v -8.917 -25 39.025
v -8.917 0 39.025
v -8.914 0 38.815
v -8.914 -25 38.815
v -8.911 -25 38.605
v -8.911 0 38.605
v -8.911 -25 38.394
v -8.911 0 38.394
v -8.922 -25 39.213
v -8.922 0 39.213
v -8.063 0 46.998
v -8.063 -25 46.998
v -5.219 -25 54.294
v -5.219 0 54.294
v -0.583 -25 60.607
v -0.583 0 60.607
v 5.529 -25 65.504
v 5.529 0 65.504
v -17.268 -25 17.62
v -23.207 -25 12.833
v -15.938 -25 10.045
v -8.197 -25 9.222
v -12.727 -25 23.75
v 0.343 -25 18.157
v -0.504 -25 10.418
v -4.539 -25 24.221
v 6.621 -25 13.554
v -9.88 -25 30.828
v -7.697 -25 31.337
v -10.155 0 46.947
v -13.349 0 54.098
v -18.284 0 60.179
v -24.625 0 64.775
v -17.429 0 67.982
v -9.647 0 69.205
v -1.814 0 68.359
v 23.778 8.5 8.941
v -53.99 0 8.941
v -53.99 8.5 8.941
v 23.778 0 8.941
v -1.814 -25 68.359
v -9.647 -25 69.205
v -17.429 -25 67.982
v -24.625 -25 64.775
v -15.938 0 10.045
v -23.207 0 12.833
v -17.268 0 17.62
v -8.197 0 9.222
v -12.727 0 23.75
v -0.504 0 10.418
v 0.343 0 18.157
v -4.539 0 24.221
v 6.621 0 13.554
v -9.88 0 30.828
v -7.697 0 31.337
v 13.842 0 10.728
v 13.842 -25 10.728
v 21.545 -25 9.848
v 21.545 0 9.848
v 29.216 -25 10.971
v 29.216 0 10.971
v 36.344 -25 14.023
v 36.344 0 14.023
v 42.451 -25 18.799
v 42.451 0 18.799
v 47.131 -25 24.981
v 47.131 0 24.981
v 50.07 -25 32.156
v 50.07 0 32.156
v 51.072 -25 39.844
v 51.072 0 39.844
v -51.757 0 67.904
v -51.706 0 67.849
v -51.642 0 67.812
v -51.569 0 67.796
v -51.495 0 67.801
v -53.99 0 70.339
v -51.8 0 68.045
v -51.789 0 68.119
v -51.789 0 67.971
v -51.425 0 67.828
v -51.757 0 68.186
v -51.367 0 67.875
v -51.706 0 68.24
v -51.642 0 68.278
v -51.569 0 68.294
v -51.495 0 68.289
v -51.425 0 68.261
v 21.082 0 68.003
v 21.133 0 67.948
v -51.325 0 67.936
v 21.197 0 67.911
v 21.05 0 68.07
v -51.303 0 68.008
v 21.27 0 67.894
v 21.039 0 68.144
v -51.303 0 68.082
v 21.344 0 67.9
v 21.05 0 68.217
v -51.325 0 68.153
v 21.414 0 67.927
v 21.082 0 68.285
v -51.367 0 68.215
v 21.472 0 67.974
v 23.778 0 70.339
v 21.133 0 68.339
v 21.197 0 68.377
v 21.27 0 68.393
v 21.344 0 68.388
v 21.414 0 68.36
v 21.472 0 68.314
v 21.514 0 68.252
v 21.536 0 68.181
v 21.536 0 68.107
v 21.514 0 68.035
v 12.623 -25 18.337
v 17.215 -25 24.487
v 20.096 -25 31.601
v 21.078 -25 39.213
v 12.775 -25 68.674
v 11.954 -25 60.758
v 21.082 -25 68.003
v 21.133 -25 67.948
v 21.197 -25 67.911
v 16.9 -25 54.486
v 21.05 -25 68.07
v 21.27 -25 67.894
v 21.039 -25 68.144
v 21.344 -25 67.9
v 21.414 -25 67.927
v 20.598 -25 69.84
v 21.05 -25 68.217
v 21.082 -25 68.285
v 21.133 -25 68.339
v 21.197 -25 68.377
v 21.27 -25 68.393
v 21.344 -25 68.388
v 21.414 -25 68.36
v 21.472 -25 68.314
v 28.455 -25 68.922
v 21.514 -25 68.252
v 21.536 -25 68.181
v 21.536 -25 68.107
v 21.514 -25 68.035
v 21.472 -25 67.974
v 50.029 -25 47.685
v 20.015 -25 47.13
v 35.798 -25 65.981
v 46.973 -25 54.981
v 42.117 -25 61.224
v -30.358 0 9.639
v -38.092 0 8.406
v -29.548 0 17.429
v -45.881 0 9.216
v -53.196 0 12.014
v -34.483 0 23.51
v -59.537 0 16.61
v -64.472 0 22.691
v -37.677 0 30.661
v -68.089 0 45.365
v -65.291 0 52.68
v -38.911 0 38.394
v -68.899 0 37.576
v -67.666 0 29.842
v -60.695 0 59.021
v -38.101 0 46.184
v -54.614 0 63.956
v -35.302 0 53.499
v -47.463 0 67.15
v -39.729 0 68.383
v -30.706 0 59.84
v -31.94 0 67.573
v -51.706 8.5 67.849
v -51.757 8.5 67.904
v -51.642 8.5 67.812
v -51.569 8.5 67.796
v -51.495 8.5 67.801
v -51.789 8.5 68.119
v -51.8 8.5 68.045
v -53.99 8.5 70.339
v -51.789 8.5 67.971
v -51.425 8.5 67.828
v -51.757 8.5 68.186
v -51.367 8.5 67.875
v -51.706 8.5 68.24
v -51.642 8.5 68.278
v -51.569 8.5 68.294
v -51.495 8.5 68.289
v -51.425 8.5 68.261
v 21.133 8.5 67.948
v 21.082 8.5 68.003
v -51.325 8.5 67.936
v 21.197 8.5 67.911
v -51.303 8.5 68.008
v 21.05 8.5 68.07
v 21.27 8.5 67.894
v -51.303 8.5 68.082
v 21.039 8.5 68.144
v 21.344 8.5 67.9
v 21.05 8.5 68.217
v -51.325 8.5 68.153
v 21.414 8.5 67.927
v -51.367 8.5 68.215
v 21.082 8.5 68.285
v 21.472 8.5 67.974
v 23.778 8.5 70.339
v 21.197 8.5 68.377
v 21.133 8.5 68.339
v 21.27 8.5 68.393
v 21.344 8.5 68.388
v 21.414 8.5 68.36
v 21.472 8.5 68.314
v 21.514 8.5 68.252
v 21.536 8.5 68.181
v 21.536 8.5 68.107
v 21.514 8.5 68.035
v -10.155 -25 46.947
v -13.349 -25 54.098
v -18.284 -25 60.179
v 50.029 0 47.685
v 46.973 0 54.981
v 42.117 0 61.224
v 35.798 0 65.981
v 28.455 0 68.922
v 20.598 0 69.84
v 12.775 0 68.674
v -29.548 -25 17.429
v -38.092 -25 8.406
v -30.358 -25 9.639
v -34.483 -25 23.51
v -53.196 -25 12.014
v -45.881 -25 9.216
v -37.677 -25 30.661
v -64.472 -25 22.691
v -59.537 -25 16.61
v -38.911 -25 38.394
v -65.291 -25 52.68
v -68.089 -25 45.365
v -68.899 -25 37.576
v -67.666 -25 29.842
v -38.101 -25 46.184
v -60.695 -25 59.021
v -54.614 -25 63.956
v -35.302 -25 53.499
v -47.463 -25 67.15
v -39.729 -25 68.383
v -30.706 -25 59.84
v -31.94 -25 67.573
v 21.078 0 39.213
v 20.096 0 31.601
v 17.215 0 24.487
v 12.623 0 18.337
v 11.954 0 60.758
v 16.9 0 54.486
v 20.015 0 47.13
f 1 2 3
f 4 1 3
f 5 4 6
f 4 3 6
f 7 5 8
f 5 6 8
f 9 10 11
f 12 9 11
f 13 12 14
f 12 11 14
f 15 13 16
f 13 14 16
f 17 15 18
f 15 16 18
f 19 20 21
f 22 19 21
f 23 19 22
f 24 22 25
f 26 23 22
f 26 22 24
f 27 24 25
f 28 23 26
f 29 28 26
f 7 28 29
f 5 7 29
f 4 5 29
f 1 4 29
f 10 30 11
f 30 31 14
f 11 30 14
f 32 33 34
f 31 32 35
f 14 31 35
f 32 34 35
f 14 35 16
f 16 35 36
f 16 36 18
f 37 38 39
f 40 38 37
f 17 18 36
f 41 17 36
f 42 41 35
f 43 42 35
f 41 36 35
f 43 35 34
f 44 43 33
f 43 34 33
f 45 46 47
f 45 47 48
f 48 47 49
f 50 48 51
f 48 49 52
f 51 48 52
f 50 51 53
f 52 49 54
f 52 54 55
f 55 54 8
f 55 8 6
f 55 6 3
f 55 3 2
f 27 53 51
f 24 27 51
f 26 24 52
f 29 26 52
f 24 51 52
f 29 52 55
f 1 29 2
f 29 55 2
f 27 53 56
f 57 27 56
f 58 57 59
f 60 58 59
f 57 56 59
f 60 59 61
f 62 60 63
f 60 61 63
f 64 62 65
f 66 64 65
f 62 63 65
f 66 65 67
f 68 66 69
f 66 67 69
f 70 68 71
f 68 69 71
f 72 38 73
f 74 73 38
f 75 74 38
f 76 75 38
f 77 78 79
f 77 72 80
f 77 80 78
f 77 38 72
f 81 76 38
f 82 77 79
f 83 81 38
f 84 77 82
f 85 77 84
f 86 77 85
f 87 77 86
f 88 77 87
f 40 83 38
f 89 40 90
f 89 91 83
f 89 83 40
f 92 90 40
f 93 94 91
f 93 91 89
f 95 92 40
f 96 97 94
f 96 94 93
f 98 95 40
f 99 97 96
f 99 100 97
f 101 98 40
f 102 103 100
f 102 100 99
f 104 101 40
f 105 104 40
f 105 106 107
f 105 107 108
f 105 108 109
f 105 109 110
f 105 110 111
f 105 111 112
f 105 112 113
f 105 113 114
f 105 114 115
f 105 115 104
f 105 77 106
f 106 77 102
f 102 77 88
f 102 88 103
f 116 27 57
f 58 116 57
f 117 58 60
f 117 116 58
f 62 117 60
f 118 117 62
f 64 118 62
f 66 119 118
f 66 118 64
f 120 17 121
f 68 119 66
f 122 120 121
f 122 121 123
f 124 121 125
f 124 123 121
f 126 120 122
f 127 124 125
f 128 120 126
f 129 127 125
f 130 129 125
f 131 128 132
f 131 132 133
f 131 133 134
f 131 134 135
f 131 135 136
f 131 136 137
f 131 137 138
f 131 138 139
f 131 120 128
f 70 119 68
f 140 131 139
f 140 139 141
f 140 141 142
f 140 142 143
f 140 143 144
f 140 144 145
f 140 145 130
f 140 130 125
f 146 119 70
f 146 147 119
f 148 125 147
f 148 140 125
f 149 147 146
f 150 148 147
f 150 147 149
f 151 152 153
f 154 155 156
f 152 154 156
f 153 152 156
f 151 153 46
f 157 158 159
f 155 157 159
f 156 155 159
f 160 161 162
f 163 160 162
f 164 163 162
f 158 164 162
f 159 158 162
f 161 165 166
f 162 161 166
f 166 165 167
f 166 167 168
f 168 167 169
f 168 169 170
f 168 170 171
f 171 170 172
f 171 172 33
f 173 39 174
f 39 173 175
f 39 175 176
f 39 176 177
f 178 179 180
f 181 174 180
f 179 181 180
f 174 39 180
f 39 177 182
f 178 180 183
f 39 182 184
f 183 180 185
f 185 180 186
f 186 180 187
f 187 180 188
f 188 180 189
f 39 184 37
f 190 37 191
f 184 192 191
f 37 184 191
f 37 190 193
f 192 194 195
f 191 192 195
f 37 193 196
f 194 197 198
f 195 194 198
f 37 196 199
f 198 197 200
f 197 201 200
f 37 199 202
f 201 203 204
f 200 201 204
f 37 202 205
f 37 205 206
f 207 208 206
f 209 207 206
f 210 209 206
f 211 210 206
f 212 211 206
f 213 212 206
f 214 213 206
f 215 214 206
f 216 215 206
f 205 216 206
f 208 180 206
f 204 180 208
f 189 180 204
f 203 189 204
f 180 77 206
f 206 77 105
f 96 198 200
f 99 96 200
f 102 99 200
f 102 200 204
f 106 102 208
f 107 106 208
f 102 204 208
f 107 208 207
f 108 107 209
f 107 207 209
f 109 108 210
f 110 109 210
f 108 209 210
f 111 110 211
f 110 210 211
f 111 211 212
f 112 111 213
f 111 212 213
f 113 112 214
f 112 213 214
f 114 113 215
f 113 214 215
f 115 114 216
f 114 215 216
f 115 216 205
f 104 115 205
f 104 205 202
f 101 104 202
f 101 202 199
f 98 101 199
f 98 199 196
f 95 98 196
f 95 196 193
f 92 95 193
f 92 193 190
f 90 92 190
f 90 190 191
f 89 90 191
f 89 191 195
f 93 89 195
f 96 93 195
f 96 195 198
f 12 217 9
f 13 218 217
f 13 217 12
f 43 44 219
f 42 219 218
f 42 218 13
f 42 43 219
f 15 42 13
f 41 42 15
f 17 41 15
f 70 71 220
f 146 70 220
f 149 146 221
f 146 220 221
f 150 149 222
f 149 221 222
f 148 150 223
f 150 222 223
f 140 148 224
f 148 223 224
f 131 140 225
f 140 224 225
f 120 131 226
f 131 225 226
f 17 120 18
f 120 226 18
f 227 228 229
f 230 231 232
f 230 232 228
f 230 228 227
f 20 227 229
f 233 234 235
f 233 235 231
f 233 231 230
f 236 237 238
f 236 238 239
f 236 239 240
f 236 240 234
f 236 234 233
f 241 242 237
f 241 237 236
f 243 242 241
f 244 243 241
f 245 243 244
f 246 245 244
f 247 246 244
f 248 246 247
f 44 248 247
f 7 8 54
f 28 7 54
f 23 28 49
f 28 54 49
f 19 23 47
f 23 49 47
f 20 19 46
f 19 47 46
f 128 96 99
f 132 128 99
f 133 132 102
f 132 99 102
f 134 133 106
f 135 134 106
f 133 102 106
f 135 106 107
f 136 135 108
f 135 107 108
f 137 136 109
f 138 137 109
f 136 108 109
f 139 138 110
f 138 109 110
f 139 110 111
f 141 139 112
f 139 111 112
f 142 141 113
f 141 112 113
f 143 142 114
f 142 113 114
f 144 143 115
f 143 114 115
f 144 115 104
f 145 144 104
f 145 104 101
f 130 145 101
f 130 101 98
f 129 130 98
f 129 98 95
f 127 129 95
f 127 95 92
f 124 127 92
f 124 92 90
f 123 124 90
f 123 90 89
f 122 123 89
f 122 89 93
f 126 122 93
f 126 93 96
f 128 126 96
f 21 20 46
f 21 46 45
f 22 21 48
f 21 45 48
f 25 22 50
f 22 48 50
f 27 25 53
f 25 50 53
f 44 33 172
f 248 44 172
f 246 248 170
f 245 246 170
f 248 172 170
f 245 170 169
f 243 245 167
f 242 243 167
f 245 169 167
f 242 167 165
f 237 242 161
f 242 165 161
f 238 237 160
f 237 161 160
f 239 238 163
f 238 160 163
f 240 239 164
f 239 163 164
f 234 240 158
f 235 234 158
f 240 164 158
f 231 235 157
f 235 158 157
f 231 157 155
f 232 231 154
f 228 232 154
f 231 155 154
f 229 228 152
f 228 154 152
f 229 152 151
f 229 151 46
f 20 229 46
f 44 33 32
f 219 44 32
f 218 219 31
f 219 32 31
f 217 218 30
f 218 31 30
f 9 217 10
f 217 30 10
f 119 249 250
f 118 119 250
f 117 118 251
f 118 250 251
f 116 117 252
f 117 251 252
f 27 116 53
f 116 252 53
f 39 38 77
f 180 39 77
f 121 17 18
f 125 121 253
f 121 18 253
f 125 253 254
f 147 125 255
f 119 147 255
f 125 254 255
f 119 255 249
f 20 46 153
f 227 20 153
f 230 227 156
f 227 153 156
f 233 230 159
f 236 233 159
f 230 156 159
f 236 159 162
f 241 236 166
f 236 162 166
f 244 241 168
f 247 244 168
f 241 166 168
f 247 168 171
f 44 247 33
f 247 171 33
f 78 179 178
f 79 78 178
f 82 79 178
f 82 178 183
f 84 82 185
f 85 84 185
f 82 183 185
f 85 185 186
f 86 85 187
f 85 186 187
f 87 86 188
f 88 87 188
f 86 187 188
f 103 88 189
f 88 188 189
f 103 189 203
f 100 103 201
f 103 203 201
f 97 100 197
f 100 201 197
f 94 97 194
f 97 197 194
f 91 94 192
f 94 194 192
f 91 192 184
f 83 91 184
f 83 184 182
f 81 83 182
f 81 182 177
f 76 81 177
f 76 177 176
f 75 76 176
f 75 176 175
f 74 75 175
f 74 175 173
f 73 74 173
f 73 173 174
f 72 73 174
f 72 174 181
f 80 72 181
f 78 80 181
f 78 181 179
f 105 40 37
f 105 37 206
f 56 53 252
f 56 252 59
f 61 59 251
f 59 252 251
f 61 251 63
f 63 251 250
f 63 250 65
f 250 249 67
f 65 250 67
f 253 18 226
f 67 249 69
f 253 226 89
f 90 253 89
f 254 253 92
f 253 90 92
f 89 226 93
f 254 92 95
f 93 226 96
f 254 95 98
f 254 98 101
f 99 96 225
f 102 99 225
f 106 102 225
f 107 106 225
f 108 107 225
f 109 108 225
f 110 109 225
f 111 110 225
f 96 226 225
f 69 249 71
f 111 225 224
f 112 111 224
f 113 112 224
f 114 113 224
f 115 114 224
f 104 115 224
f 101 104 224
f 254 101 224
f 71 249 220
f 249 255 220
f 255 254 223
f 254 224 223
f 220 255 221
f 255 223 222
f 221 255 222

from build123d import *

# Parameters (mm, degrees)
F1_DEPTH = 25
F2_W     = 77.7685903013
F2_H     = 61.3984446973
F3_DEPTH = 8.5
F4_R     = 0.25
F5_DEPTH = 52.9


with BuildPart() as f1:
    # F0 (on Front) → F1 (new body)
    with BuildSketch(Plane.XZ):
        with BuildLine():
            ThreePointArc((-24.6252371606, 64.7749764202), (-68.899377051, 37.5757018533), (-23.2070443664, 12.832809261))
            ThreePointArc((-23.2070443664, 12.832809261), (-38.9105528593, 38.3944958448), (-24.6252371606, 64.7749764202))
        make_face()
    extrude(amount=F1_DEPTH)


with BuildPart() as f1b:
    # F0 (on Front) → F1, piece 2 (new body)
    with BuildSketch(Plane.XZ):
        with BuildLine():
            ThreePointArc((21.0782713324, 39.2132898363), (17.2153351945, 24.4873300147), (6.6213451544, 13.553733017))
            ThreePointArc((6.6213451544, 13.553733017), (36.3440176728, 14.0226209778), (51.0716362988, 39.8442082095))
            ThreePointArc((51.0716362988, 39.8442082095), (35.7975961204, 65.9812720716), (5.5285624767, 65.5037650288))
            ThreePointArc((5.5285624767, 65.5037650288), (16.8998585641, 54.4856712104), (21.0782713324, 39.2132898363))
        make_face()
    extrude(amount=F1_DEPTH)


with BuildPart() as f1c:
    # F0 (on Front) → F1, piece 3 (new body)
    with BuildSketch(Plane.XZ):
        with BuildLine():
            ThreePointArc((-24.6252371606, 64.7749764202), (-13.3488662754, 54.0980043378), (-8.9217286676, 39.2132898363))
            ThreePointArc((-8.9217286676, 39.2132898363), (-5.2188388937, 54.2944993538), (5.5285624767, 65.5037650288))
            ThreePointArc((5.5285624767, 65.5037650288), (-9.6465884056, 69.2045315305), (-24.6252371606, 64.7749764202))
        make_face()
    extrude(amount=F1_DEPTH)


with BuildPart() as f1d:
    # F0 (on Front) → F1, piece 4 (new body)
    with BuildSketch(Plane.XZ):
        with BuildLine():
            ThreePointArc((-8.9171878929, 39.025414218), (-8.9122116636, 38.7099724752), (-8.9105528593, 38.3944958448))
            ThreePointArc((-8.9105528593, 38.3944958448), (-12.7274929275, 23.7504741088), (-23.2070443664, 12.832809261))
            ThreePointArc((-23.2070443664, 12.832809261), (-8.1968689297, 9.2220481421), (6.6213451544, 13.553733017))
            ThreePointArc((6.6213451544, 13.553733017), (-4.5391110305, 24.2208404151), (-8.9171878929, 39.025414218))
        make_face()
    extrude(amount=F1_DEPTH)


with BuildPart() as f3:
    # F2 (on Front) → F3 (new body)
    with BuildSketch(Plane.XZ):
        with Locations((-15.1060316712, 39.6397346631)):
            Rectangle(F2_W, F2_H)
    extrude(amount=-F3_DEPTH)


with BuildPart() as f5_tool:
    # F4 (on face) → F5 (new body)
    with BuildSketch(Plane(origin=(0, 8.5, 0), x_dir=(-1, 0, 0), z_dir=(0, 1, 0))):
        with Locations((-21.2886072695, 68.143799901)):
            Circle(F4_R)
        with Locations((51.5504516661, 68.0448934436)):
            Circle(F4_R)
    extrude(amount=-F5_DEPTH)


with BuildPart() as f1b_1:
    add(f1b.part)

    # F5: cut by f5_tool
    add(f5_tool.part, mode=Mode.SUBTRACT)


with BuildPart() as f3_1:
    add(f3.part)

    # F5: cut by f5_tool
    add(f5_tool.part, mode=Mode.SUBTRACT)


solid = Compound([f1.part, f1c.part, f1d.part, f1b_1.part, f3_1.part])
